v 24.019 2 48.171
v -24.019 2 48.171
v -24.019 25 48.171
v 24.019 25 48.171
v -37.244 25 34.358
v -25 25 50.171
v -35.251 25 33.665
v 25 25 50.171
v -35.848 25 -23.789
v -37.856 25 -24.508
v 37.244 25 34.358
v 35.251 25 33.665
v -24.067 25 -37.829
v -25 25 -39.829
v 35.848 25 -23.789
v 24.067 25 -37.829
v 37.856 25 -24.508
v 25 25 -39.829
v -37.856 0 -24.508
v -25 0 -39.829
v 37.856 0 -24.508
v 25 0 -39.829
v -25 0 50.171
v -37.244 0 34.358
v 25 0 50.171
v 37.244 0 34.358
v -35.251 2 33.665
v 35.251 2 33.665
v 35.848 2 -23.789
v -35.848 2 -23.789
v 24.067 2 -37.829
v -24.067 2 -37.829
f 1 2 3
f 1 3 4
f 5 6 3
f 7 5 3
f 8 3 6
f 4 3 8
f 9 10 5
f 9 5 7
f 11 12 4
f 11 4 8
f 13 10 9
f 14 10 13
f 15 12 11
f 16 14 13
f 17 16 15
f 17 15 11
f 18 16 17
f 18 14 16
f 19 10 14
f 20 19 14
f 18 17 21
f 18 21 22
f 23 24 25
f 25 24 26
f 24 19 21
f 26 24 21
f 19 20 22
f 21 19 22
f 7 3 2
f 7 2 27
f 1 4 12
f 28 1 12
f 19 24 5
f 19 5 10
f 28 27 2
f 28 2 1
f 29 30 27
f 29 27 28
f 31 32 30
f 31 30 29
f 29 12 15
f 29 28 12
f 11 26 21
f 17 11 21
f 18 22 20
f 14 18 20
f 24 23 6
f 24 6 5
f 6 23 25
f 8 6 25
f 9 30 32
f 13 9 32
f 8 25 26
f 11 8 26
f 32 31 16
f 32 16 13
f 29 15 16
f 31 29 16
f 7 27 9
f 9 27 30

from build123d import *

# Parameters (mm, degrees)
AUFSATZ_LINEAR_AUSTRAGEN1_DEPTH = 25
WANDUNG2_T                      = -2


with BuildPart() as part:
    # Skizze1 → Aufsatz-Linear austragen1 (new body)
    with BuildSketch(Plane(origin=(0, 0, 0), x_dir=(1, 0, 0), z_dir=(0, 1, 0))):
        Polygon((0, -50.171355376), (-25, -50.171355376), (-37.244282987, -34.357515421), (-37.855752194, 24.507755761), (-25, 39.828644624), (0, 39.828644624), align=None)
    aufsatz_linear_austragen1 = extrude(amount=AUFSATZ_LINEAR_AUSTRAGEN1_DEPTH)

    # Spiegeln1: Aufsatz-Linear austragen1 across plane
    add(aufsatz_linear_austragen1.mirror(Plane(origin=(0, 0, 0), x_dir=(0, 0, 1), z_dir=(1, 0, 0))))

    # Wandung2
    wandung2_openings = [part.faces().sort_by_distance(p)[0] for p in [
        (0, 25, 5.030518753),
    ]]
    offset(amount=WANDUNG2_T, openings=wandung2_openings, kind=Kind.INTERSECTION)


solid = part.part
